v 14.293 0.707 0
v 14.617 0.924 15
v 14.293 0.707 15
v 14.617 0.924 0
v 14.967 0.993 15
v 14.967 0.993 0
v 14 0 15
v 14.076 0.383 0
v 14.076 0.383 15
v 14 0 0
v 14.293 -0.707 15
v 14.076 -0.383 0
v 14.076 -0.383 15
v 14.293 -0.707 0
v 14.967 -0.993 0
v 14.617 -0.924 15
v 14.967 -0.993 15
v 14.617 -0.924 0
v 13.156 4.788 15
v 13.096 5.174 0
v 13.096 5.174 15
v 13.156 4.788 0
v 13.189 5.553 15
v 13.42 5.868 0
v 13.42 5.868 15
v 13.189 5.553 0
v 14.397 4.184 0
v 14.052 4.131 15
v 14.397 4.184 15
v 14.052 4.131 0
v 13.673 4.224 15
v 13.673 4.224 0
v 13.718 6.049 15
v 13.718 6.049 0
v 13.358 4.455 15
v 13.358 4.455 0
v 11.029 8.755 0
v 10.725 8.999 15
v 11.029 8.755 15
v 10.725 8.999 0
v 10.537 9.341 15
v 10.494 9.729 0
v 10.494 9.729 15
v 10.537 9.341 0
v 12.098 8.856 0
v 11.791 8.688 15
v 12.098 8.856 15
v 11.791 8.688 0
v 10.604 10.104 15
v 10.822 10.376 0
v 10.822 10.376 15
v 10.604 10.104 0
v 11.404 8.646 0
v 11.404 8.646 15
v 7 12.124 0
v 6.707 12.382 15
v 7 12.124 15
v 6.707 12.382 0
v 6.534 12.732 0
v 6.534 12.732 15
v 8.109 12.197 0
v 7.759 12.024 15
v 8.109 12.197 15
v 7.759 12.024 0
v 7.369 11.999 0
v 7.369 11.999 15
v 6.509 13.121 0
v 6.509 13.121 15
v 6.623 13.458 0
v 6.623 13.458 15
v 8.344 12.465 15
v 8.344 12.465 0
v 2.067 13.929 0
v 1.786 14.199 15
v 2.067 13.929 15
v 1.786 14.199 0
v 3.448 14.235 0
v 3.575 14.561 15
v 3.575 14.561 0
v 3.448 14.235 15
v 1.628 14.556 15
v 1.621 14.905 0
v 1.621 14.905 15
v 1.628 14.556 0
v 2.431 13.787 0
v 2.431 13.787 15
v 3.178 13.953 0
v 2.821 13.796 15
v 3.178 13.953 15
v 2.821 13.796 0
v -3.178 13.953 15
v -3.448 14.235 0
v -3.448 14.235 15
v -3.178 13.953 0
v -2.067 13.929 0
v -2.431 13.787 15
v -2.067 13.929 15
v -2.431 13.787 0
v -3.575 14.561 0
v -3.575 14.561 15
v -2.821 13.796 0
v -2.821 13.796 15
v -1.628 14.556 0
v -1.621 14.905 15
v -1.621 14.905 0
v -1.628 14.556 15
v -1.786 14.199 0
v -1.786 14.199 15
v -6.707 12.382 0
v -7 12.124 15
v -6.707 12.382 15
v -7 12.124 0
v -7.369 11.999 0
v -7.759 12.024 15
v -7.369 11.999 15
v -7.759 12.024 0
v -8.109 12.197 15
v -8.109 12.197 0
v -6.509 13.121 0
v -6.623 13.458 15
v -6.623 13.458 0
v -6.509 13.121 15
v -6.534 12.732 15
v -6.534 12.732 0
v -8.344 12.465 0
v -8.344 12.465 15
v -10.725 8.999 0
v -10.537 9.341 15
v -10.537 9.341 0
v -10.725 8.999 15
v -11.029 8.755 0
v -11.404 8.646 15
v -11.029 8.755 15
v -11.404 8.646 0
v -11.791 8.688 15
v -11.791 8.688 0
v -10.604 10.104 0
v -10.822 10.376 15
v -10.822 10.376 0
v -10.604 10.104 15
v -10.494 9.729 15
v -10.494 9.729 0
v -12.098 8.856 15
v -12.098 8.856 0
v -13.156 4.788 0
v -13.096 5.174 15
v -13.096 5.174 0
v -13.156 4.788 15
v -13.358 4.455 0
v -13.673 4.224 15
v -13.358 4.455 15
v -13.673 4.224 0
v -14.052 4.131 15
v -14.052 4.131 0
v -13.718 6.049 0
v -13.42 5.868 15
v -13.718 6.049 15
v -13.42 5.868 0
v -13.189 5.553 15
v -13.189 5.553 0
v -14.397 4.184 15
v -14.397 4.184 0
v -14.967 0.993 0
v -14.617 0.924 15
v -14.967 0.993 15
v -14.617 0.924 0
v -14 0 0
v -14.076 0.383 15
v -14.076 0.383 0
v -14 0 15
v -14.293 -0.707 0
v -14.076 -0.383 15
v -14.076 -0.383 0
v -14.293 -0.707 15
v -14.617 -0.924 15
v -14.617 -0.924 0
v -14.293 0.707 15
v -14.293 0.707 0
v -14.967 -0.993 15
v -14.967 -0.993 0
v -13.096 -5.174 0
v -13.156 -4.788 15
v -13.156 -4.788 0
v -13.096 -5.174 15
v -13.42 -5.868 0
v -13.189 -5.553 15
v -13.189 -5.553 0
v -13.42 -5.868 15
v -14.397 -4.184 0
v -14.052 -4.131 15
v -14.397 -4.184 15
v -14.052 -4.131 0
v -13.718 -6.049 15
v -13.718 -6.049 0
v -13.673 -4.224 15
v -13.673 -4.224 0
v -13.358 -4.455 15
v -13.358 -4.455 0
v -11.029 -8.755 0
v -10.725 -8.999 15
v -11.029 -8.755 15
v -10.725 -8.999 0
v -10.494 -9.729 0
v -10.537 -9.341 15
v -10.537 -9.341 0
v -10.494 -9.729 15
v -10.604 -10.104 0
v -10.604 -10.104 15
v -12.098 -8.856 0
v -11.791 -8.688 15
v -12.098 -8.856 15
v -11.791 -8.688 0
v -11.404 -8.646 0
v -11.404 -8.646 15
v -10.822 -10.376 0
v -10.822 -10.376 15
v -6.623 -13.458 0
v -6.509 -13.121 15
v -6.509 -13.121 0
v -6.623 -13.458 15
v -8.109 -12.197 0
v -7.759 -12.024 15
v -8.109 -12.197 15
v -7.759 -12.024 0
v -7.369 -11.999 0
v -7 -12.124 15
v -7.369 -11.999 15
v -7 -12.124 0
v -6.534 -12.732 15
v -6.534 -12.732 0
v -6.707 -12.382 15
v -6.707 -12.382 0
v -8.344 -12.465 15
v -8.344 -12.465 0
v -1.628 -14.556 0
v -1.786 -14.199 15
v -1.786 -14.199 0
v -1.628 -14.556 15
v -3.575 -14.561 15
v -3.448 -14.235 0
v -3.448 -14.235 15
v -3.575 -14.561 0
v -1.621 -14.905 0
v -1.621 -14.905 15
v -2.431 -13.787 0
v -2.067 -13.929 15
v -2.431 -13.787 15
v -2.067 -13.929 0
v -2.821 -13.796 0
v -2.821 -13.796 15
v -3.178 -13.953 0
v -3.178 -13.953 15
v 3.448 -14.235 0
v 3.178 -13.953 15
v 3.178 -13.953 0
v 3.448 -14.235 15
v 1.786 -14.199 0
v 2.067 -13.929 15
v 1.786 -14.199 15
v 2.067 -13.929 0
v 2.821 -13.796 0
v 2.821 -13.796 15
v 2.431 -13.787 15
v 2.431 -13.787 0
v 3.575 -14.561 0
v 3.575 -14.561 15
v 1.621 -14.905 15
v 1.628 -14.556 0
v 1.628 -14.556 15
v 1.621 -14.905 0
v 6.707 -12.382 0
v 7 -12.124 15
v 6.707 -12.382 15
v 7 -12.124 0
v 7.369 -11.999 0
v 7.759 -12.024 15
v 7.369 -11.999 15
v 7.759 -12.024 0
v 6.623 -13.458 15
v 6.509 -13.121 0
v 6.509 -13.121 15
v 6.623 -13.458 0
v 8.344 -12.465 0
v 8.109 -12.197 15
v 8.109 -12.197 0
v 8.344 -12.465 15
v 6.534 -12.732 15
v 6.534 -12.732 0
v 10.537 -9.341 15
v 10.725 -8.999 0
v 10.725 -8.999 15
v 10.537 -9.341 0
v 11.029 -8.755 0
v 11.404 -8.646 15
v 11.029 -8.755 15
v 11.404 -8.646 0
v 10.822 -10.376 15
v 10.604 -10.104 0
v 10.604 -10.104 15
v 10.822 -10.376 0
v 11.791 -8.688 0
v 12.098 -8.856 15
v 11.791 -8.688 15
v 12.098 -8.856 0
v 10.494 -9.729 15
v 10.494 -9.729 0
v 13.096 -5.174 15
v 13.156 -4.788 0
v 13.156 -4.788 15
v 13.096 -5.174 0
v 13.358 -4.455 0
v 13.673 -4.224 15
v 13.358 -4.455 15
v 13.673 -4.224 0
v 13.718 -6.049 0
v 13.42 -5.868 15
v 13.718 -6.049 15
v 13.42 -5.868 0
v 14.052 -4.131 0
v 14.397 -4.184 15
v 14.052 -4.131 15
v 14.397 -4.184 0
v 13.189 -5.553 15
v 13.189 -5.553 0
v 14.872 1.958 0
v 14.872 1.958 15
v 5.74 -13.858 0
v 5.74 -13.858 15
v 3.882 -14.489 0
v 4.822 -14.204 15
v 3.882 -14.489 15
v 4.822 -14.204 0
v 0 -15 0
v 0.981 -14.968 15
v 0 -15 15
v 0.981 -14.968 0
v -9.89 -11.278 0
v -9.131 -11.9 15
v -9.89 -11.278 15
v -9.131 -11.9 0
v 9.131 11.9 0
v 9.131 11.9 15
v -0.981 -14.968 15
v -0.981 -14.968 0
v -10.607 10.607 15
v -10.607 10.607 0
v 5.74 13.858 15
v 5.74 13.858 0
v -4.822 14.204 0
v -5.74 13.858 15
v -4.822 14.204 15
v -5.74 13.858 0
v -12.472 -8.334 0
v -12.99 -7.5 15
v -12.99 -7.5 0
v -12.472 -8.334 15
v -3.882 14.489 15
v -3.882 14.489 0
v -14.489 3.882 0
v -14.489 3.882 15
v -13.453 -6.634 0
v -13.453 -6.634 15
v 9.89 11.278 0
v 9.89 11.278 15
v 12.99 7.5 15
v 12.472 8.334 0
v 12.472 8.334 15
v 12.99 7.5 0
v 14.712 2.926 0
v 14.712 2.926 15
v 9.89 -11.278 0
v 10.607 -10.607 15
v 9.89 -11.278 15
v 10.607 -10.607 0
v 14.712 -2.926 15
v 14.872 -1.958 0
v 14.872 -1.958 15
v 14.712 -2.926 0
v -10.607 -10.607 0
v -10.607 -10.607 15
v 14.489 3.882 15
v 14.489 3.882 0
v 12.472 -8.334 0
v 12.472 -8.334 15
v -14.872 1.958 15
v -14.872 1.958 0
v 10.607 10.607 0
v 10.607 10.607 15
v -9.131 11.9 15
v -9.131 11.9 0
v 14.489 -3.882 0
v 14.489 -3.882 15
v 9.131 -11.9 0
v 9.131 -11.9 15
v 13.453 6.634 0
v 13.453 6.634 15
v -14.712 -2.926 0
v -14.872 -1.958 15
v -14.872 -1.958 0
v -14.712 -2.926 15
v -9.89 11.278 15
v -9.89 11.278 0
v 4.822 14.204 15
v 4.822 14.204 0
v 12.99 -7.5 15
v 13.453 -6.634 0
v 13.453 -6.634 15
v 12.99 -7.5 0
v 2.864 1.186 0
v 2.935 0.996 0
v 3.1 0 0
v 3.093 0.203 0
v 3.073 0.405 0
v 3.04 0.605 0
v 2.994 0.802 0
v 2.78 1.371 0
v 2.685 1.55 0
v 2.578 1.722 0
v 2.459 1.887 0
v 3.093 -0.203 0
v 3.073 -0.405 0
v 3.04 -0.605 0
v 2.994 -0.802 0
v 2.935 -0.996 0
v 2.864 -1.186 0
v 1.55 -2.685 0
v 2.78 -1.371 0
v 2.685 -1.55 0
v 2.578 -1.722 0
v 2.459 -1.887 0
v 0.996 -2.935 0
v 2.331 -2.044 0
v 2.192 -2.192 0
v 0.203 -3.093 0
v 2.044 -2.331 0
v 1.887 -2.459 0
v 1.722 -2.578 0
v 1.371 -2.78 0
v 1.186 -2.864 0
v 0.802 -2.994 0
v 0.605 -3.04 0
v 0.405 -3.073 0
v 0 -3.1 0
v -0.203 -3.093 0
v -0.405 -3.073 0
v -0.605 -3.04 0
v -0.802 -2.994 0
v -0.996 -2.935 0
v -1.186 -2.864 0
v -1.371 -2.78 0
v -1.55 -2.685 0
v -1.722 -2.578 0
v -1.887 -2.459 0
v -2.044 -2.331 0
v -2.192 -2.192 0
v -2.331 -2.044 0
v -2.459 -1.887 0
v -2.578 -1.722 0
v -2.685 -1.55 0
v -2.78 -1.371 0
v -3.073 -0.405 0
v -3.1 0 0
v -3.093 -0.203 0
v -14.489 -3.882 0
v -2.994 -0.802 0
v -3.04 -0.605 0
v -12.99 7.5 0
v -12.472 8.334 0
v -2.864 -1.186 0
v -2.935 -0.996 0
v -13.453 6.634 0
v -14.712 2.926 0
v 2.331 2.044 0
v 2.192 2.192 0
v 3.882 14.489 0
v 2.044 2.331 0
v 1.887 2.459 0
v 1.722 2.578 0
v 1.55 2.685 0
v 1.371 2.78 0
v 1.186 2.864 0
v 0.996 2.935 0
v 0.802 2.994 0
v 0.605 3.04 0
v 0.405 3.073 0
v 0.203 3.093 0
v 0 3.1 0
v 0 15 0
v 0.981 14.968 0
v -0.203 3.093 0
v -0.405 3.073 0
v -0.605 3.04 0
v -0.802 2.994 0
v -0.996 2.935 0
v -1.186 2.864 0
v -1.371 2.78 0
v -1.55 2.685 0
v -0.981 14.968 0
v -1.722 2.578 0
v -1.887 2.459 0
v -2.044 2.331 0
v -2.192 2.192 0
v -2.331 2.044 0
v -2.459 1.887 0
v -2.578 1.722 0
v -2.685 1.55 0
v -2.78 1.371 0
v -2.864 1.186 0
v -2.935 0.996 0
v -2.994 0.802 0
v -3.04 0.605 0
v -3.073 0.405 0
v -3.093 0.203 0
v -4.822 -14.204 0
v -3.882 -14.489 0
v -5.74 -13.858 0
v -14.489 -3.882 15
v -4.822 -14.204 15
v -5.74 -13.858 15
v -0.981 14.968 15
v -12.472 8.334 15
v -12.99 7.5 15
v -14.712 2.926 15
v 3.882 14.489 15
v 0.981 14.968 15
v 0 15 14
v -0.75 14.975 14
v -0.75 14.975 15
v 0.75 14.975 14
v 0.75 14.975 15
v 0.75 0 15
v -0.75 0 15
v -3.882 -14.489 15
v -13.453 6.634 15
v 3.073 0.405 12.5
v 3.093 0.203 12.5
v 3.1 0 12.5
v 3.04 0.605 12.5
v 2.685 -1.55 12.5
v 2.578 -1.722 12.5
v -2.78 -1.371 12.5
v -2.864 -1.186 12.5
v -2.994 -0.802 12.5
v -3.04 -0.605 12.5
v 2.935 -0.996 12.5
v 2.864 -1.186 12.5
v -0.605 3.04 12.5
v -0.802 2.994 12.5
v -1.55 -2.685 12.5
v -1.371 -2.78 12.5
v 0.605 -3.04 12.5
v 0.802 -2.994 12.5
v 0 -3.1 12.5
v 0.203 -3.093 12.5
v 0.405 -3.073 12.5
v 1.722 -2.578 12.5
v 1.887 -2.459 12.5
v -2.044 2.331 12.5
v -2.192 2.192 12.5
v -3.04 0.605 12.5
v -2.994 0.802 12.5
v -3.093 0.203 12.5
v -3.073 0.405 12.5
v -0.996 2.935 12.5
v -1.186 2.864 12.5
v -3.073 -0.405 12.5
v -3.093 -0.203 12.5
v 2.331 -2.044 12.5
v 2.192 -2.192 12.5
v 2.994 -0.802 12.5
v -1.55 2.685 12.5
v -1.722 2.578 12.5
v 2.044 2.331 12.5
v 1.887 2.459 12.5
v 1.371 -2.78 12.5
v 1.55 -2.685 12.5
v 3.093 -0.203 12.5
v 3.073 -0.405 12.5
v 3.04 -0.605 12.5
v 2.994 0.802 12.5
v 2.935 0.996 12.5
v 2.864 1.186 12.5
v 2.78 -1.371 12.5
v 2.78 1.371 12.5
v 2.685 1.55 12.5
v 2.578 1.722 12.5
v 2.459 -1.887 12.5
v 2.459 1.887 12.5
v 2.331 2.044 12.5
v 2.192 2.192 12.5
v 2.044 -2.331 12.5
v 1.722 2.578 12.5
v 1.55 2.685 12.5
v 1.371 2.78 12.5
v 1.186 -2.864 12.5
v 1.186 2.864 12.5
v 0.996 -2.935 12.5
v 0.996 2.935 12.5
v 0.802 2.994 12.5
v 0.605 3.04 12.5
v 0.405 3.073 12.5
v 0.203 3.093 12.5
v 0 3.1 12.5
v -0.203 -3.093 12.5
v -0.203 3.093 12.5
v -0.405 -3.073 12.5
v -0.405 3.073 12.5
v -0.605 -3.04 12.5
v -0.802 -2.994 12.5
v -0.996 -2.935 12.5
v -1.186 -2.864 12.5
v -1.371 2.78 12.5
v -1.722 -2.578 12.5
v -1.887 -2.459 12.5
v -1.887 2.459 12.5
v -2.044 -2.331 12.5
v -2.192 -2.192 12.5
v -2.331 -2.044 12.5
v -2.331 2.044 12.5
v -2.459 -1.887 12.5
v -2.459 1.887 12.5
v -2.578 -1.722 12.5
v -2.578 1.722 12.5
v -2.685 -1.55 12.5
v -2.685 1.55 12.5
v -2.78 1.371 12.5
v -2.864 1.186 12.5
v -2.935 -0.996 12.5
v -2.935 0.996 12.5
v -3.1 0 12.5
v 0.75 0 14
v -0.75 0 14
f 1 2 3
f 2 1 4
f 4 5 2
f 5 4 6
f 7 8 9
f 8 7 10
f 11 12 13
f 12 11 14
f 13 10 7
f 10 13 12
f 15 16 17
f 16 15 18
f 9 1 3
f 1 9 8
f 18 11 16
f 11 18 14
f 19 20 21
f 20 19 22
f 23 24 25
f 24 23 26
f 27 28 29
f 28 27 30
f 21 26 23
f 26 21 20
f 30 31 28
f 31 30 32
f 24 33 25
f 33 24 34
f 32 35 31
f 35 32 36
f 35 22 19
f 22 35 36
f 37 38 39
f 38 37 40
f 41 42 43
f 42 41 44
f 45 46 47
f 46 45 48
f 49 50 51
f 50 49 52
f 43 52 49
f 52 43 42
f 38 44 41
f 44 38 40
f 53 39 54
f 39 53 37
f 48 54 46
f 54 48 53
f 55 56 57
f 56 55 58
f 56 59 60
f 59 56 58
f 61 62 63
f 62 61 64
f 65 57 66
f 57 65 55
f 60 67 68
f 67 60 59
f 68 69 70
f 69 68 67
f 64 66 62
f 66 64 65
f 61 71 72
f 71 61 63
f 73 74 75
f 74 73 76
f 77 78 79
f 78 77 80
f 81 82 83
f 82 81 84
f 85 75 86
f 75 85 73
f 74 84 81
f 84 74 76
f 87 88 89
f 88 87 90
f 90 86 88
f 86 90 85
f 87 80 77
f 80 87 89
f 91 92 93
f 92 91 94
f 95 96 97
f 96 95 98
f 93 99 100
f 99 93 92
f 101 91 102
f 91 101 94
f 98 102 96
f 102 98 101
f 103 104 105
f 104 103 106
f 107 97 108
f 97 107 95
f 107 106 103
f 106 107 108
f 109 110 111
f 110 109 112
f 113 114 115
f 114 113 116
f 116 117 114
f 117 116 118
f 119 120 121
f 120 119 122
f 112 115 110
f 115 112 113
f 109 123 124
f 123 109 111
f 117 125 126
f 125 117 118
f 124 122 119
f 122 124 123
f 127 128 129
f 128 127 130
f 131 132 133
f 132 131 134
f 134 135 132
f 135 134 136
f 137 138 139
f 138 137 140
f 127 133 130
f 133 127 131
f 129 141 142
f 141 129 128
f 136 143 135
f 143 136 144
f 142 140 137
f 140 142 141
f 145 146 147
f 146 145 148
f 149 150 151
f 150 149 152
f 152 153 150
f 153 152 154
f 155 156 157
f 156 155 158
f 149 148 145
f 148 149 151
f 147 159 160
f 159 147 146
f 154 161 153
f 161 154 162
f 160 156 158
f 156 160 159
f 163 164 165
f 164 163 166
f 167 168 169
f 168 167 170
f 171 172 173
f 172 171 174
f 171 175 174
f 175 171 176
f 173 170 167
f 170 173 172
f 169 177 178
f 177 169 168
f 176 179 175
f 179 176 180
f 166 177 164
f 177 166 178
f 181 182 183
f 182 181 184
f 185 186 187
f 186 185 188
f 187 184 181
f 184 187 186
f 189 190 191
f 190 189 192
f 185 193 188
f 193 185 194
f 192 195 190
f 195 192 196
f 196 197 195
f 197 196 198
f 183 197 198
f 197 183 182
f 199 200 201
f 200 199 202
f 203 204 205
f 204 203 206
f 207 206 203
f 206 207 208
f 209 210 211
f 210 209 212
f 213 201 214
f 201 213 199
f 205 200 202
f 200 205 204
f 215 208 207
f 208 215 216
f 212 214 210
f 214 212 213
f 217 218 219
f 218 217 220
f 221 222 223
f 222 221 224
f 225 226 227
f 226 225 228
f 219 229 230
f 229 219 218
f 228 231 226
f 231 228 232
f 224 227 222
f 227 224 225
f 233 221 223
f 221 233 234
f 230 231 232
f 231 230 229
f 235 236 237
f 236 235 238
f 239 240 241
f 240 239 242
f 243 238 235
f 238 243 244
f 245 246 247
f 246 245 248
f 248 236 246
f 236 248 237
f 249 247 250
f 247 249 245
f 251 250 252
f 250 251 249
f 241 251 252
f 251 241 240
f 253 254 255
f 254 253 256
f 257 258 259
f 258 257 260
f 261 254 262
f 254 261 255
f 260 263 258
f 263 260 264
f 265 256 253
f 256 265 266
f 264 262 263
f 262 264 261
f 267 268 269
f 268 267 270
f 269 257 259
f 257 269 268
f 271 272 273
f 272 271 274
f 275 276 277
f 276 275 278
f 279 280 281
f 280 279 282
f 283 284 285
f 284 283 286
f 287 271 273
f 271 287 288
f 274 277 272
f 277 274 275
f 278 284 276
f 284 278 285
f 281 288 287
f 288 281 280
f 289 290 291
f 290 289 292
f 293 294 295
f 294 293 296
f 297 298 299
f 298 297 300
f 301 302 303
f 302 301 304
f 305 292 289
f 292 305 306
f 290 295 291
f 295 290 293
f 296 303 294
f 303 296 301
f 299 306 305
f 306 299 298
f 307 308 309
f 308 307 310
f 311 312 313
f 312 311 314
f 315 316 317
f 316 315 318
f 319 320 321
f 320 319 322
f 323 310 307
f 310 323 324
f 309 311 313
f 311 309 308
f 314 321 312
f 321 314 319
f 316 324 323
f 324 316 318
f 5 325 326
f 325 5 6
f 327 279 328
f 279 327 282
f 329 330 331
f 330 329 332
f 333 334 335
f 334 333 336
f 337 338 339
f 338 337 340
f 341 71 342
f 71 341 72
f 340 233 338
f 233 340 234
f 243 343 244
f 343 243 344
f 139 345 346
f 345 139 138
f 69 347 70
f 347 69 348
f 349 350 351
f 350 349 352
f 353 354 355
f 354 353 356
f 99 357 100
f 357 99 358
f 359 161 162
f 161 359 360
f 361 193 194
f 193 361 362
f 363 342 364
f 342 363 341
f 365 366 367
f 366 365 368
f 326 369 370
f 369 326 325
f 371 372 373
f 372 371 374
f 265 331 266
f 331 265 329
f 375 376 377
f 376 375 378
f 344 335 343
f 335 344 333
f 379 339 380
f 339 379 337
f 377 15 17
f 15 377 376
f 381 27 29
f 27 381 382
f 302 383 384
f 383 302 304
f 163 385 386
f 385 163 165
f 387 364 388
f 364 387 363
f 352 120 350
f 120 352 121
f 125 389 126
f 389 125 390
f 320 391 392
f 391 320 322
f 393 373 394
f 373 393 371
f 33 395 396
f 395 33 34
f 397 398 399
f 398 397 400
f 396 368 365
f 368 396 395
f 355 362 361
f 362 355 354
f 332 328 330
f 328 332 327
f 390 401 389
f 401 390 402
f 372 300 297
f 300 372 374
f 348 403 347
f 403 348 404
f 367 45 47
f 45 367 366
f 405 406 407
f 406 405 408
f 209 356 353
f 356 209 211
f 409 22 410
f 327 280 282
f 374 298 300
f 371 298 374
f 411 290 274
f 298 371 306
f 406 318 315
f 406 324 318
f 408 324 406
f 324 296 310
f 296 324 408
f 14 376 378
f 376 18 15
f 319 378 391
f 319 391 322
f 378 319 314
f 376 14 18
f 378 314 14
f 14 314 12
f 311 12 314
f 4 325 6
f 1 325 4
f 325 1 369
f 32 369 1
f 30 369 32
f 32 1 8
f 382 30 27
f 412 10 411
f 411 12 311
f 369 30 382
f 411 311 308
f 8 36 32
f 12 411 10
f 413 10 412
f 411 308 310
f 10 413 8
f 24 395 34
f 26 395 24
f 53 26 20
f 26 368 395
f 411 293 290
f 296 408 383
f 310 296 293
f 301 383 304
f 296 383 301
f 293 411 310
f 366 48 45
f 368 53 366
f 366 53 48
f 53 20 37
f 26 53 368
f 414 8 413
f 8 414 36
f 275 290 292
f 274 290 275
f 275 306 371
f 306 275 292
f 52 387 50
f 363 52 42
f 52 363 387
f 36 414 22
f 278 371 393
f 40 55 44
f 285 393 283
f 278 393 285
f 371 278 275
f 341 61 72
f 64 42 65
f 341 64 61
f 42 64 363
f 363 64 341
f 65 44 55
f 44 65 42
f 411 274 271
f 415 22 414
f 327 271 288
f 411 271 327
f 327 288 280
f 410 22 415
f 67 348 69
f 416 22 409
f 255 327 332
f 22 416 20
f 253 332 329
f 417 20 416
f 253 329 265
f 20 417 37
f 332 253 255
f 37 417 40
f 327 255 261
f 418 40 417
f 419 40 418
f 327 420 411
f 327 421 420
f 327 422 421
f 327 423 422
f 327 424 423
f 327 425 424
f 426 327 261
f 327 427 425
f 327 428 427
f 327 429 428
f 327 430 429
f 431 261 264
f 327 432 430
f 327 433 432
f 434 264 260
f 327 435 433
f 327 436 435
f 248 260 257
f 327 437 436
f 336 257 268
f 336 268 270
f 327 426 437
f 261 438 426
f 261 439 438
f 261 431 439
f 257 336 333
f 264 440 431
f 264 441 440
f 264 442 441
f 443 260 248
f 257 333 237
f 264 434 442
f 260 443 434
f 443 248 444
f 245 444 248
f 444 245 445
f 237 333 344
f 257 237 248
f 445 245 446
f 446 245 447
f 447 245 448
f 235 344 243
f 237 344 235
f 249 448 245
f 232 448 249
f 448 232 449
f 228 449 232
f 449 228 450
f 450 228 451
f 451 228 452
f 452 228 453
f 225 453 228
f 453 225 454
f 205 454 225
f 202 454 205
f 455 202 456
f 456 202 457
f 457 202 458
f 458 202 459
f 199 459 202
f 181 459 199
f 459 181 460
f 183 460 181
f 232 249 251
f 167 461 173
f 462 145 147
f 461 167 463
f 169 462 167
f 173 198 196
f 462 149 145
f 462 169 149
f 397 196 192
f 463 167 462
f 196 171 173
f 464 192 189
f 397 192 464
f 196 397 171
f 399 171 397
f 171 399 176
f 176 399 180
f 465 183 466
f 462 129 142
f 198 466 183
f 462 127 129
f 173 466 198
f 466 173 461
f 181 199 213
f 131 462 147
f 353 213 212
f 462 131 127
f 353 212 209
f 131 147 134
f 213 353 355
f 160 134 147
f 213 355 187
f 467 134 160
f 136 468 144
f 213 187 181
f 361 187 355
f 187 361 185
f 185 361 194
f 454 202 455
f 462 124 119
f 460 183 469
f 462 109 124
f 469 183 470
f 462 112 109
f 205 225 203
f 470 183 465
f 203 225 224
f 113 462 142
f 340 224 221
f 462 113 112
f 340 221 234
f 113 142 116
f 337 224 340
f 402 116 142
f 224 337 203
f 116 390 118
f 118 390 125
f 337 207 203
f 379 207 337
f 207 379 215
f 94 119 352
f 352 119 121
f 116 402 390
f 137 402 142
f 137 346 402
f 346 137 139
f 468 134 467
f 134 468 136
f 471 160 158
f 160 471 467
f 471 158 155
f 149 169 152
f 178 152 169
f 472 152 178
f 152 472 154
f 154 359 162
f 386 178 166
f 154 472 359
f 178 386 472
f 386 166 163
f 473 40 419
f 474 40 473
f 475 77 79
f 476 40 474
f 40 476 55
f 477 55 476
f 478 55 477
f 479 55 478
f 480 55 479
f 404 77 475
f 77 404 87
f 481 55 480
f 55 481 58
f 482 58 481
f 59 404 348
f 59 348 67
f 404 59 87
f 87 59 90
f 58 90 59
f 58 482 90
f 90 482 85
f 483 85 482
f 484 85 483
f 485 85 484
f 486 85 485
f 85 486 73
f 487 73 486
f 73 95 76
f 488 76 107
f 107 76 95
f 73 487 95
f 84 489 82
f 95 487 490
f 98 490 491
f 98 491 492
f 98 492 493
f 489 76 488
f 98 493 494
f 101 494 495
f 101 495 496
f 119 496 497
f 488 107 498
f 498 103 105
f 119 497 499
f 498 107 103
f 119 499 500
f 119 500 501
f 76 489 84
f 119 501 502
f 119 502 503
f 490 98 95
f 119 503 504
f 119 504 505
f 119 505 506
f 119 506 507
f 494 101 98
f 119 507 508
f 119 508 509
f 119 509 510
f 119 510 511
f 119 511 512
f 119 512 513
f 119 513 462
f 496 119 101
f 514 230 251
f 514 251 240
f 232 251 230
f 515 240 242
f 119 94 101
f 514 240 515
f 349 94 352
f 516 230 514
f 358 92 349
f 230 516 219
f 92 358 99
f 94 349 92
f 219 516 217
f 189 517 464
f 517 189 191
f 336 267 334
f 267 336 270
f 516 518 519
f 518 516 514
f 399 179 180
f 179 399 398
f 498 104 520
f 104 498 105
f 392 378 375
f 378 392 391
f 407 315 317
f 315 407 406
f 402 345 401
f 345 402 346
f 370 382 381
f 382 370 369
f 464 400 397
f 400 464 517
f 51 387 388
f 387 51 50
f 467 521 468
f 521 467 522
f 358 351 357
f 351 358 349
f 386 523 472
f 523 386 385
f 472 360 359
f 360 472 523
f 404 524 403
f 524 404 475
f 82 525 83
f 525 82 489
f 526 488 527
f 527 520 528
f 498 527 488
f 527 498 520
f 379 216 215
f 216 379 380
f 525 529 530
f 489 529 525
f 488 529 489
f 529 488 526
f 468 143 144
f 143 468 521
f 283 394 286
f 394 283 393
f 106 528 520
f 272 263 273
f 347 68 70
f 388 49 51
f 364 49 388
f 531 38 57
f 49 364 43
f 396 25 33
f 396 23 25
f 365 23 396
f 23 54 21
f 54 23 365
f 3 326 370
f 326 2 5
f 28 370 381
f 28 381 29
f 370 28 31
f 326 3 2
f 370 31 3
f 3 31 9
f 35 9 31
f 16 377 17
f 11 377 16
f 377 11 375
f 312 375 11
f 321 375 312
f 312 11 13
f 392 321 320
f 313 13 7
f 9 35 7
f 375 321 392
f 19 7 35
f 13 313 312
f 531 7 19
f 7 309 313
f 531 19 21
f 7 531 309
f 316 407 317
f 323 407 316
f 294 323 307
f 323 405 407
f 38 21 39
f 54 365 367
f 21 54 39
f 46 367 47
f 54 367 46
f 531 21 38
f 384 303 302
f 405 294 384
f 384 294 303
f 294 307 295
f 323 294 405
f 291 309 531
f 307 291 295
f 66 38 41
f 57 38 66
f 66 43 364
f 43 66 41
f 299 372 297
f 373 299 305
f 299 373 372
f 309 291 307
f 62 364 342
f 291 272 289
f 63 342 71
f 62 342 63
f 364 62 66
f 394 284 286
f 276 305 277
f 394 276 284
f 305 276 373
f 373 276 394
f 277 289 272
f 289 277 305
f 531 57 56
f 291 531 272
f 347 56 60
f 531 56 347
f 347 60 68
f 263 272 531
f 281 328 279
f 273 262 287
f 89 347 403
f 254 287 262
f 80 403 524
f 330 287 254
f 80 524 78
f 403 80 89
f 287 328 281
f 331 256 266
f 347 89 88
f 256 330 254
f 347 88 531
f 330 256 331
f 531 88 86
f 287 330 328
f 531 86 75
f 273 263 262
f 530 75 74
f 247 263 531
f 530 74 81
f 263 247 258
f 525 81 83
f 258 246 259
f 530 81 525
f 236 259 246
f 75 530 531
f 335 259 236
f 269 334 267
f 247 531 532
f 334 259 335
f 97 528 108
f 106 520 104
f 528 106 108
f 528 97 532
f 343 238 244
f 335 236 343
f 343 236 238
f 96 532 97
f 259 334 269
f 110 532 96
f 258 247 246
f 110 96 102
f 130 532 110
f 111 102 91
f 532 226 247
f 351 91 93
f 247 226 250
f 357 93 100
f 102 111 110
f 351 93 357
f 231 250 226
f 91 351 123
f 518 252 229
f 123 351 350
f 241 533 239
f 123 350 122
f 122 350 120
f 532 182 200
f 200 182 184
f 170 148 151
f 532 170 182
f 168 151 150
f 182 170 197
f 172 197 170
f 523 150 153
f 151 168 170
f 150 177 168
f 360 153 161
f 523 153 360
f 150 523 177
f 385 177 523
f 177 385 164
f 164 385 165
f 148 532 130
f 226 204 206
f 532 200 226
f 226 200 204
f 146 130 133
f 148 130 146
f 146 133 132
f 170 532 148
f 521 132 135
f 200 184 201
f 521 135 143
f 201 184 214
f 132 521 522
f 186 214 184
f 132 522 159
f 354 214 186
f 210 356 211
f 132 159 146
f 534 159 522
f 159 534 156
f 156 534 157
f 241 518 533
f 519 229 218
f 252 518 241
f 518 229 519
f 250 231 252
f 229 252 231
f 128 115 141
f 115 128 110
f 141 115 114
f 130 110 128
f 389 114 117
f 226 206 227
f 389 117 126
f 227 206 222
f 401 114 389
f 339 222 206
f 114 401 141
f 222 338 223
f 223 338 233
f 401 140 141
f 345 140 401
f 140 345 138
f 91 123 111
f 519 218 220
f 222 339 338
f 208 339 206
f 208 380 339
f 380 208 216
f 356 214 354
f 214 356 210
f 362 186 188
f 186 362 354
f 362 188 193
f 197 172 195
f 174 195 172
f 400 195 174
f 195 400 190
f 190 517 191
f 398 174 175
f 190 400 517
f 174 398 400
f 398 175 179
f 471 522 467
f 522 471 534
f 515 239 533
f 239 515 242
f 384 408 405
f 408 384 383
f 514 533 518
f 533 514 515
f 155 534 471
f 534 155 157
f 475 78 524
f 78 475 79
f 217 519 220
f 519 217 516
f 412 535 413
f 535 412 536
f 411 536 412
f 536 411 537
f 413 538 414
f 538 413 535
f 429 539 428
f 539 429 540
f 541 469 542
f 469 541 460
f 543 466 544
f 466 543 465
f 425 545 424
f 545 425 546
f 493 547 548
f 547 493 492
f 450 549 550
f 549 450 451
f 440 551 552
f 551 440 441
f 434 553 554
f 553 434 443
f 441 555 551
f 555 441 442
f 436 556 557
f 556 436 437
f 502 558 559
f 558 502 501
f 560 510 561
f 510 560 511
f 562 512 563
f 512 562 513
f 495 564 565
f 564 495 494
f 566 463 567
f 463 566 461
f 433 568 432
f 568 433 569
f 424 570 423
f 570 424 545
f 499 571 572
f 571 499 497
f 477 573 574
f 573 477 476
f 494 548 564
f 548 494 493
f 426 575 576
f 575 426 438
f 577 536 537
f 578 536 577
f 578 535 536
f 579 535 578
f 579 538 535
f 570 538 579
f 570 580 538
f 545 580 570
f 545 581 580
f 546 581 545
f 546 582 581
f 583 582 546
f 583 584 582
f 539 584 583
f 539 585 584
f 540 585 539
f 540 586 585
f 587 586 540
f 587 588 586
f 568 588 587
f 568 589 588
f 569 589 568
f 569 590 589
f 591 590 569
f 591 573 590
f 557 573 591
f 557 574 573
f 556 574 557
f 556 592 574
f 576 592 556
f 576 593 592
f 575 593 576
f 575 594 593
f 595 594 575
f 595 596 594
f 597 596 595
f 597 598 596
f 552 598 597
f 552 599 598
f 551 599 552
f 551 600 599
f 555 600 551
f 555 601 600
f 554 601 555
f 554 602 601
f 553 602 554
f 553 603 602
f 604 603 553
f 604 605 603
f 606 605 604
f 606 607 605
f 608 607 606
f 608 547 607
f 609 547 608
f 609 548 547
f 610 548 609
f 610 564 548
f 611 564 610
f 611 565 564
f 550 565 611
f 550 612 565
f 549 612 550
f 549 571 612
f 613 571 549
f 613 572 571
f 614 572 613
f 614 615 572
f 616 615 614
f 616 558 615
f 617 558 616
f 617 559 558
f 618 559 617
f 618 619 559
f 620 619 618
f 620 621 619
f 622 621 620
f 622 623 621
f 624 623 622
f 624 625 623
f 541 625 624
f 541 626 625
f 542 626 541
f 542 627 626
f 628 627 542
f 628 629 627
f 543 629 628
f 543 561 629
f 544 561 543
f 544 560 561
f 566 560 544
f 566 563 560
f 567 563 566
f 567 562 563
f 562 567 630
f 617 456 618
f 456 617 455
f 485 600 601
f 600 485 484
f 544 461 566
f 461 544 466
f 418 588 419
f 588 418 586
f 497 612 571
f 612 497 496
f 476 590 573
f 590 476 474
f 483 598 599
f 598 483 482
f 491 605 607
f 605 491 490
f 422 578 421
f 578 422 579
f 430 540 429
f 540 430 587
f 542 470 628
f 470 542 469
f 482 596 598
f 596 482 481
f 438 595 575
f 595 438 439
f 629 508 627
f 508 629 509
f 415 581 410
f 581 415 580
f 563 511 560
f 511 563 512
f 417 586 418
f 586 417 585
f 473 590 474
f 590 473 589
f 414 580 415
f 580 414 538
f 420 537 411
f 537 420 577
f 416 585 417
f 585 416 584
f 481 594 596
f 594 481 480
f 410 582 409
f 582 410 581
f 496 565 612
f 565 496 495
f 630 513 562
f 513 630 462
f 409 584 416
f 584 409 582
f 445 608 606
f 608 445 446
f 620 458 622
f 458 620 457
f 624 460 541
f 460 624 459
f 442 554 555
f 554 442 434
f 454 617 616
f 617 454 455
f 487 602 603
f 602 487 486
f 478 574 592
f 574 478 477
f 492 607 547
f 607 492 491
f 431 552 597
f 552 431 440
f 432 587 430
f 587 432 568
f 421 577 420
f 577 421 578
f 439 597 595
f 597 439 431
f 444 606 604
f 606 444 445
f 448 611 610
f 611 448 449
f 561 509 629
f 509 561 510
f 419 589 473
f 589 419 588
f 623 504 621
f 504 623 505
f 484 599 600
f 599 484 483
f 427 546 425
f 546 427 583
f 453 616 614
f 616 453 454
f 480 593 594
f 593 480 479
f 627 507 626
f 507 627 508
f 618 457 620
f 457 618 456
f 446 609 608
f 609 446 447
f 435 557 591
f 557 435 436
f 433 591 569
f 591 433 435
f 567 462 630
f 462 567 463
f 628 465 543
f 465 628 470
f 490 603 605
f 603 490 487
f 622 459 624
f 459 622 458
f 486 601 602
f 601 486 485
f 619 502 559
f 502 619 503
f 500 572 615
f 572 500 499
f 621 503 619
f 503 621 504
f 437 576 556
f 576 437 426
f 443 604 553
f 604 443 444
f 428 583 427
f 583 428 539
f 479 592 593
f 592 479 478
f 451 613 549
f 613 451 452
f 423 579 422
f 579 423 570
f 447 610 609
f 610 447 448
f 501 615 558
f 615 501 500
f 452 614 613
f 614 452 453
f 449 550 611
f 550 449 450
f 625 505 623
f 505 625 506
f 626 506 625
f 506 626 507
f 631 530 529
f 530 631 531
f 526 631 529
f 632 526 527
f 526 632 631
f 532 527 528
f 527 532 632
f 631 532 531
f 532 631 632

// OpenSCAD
// Replacement knob for hotplate stirrer (D-shaft 6 mm)
// Print orientation: flat bottom face on bed (z = 0)

$fn = 96;

// --- Dimensions (mm) ---
knob_d        = 30;    // knob outer diameter
knob_h        = 15;    // knob height
bore_depth    = 12;    // D-bore depth from bottom face
bore_flat_w   = 4.7;   // width of D-bore (flat to opposite side)
bore_d        = 6.2;   // D-bore circle diameter
groove_count  = 18;    // number of grip grooves
groove_d      = 2;     // grip groove diameter
pointer_w     = 1.5;   // pointer groove width
pointer_d     = 1;     // pointer groove depth

eps           = 0.5;   // overcut for clean differences

difference() {
    // Main body
    cylinder(d = knob_d, h = knob_h);

    // D-shaped blind bore from bottom face
    translate([0, 0, -eps])
        cylinder(d = bore_d, h = bore_depth + 2 * eps);
    translate([-(bore_flat_w - bore_d) / 2, 0, -eps])
        cube([(bore_flat_w - bore_d) / 2, bore_depth + 2 * eps, bore_depth + 2 * eps]);

    // Vertical grip grooves along full height
    for (i = [0 : groove_count - 1])
        rotate([0, 0, i * 360 / groove_count])
            translate([knob_d / 2, 0, -eps])
                cylinder(d = groove_d, h = knob_h + 2 * eps, $fn = 16);

    // Pointer groove from centre to outer edge, on flat side
    translate([-pointer_w / 2, 0, knob_h - pointer_d])
        cube([pointer_w, knob_d / 2 + eps, pointer_d]);
}
